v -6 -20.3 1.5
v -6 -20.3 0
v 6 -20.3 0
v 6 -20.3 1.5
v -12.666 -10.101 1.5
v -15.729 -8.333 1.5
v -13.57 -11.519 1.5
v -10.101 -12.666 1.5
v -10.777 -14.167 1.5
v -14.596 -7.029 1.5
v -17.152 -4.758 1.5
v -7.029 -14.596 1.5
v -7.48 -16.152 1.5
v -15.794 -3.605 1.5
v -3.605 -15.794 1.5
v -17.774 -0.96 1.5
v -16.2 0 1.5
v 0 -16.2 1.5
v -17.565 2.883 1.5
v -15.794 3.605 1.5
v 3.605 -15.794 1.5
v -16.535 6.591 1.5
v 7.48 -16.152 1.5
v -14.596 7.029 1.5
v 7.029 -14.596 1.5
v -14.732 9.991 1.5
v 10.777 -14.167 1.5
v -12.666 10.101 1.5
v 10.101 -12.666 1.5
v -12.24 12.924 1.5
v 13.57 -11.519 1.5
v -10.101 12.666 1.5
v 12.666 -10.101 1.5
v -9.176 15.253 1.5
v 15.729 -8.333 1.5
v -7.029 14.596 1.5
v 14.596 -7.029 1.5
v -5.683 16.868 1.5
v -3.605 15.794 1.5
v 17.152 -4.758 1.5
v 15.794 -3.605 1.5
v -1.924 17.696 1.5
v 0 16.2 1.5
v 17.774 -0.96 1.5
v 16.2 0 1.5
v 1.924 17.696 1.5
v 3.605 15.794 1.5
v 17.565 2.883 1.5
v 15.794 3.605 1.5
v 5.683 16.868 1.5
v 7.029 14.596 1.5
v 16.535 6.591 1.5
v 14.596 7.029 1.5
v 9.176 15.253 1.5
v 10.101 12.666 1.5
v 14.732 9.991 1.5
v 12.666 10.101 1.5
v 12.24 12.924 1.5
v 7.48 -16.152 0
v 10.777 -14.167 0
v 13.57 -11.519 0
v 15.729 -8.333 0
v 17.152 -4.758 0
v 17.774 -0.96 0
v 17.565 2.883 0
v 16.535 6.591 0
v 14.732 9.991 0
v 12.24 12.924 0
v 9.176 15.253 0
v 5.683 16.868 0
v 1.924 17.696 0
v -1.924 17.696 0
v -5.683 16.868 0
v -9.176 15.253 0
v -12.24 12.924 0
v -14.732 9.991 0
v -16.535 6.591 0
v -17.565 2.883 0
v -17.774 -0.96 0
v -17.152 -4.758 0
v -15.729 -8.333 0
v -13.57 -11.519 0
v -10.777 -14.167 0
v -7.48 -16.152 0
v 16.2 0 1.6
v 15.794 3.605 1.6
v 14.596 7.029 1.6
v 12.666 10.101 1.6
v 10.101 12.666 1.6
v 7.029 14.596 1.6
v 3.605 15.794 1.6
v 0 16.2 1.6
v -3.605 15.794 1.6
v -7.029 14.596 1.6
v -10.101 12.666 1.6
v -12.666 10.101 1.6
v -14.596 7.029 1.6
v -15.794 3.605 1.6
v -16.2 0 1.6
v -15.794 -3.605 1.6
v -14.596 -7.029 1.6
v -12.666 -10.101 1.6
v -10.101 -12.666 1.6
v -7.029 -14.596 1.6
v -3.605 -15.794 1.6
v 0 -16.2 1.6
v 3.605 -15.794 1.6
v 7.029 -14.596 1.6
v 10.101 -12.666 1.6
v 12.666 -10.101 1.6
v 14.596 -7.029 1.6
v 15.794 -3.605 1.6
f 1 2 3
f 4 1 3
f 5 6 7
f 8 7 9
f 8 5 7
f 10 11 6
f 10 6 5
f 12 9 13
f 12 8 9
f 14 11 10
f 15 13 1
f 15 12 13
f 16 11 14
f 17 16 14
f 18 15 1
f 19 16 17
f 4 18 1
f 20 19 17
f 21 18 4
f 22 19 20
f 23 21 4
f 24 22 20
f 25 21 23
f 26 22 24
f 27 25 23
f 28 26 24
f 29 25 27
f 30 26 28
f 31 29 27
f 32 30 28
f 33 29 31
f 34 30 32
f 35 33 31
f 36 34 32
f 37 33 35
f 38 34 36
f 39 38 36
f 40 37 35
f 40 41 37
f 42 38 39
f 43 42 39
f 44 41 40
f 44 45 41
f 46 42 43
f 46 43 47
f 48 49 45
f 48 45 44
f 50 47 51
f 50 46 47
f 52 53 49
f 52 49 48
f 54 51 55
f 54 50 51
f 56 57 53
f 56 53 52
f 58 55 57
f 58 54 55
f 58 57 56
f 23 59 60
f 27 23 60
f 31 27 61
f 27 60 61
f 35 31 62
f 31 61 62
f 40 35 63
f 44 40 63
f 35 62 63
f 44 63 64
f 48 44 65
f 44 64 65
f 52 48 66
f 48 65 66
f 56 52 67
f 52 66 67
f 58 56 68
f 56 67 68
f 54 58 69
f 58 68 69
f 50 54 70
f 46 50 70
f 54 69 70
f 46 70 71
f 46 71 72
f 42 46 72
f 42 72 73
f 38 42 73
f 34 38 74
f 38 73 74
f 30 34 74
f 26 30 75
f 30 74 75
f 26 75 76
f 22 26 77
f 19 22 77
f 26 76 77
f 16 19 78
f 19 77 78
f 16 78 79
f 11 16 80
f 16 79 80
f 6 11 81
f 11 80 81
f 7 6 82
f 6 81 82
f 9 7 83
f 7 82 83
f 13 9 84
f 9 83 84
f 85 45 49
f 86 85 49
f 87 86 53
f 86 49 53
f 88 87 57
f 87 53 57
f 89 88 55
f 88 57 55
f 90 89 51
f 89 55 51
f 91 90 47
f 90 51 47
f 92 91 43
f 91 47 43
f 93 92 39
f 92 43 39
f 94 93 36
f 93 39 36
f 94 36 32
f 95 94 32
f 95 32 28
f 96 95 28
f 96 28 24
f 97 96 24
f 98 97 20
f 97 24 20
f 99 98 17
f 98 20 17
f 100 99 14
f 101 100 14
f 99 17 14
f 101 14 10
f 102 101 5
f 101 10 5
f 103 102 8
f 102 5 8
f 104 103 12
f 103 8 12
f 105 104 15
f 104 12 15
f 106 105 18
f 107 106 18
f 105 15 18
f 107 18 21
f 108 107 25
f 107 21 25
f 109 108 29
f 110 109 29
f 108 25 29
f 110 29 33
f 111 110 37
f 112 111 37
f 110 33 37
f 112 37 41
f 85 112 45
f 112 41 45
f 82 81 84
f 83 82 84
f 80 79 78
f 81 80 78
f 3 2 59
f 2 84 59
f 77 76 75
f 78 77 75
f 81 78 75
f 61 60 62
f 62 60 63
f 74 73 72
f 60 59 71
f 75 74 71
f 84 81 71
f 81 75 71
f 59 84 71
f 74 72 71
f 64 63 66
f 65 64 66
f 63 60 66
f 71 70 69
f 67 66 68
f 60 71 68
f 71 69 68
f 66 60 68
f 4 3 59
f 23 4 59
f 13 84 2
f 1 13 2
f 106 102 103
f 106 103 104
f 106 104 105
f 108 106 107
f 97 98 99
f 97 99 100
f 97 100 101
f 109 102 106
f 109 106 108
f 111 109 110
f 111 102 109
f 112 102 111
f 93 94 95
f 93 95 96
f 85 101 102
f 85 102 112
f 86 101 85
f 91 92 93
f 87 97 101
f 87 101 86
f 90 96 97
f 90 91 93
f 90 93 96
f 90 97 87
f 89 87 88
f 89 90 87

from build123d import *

# Parameters (mm, degrees)
EXTRUDE_1_DEPTH = 1.5
SKETCH_3_R      = 16.2
EXTRUDE_2_DEPTH = 0.1


with BuildPart() as part:
    # 草图2 → 凸台-拉伸1 (new body)
    with BuildSketch(Plane.XY):
        with BuildLine():
            Line((-6, -20.3), (6, -20.3))
            Line((6, -20.3), (7.479773249, -16.152182272))
            ThreePointArc((7.479773249, -16.152182272), (0, 17.8), (-7.479773249, -16.152182272))
            Line((-7.479773249, -16.152182272), (-6, -20.3))
        make_face()
    extrude(amount=EXTRUDE_1_DEPTH)

    # 草图3 → 凸台-拉伸2 (add)
    with BuildSketch(Plane.XY.offset(1.5)):
        Circle(SKETCH_3_R)
    extrude(amount=EXTRUDE_2_DEPTH)


solid = part.part
